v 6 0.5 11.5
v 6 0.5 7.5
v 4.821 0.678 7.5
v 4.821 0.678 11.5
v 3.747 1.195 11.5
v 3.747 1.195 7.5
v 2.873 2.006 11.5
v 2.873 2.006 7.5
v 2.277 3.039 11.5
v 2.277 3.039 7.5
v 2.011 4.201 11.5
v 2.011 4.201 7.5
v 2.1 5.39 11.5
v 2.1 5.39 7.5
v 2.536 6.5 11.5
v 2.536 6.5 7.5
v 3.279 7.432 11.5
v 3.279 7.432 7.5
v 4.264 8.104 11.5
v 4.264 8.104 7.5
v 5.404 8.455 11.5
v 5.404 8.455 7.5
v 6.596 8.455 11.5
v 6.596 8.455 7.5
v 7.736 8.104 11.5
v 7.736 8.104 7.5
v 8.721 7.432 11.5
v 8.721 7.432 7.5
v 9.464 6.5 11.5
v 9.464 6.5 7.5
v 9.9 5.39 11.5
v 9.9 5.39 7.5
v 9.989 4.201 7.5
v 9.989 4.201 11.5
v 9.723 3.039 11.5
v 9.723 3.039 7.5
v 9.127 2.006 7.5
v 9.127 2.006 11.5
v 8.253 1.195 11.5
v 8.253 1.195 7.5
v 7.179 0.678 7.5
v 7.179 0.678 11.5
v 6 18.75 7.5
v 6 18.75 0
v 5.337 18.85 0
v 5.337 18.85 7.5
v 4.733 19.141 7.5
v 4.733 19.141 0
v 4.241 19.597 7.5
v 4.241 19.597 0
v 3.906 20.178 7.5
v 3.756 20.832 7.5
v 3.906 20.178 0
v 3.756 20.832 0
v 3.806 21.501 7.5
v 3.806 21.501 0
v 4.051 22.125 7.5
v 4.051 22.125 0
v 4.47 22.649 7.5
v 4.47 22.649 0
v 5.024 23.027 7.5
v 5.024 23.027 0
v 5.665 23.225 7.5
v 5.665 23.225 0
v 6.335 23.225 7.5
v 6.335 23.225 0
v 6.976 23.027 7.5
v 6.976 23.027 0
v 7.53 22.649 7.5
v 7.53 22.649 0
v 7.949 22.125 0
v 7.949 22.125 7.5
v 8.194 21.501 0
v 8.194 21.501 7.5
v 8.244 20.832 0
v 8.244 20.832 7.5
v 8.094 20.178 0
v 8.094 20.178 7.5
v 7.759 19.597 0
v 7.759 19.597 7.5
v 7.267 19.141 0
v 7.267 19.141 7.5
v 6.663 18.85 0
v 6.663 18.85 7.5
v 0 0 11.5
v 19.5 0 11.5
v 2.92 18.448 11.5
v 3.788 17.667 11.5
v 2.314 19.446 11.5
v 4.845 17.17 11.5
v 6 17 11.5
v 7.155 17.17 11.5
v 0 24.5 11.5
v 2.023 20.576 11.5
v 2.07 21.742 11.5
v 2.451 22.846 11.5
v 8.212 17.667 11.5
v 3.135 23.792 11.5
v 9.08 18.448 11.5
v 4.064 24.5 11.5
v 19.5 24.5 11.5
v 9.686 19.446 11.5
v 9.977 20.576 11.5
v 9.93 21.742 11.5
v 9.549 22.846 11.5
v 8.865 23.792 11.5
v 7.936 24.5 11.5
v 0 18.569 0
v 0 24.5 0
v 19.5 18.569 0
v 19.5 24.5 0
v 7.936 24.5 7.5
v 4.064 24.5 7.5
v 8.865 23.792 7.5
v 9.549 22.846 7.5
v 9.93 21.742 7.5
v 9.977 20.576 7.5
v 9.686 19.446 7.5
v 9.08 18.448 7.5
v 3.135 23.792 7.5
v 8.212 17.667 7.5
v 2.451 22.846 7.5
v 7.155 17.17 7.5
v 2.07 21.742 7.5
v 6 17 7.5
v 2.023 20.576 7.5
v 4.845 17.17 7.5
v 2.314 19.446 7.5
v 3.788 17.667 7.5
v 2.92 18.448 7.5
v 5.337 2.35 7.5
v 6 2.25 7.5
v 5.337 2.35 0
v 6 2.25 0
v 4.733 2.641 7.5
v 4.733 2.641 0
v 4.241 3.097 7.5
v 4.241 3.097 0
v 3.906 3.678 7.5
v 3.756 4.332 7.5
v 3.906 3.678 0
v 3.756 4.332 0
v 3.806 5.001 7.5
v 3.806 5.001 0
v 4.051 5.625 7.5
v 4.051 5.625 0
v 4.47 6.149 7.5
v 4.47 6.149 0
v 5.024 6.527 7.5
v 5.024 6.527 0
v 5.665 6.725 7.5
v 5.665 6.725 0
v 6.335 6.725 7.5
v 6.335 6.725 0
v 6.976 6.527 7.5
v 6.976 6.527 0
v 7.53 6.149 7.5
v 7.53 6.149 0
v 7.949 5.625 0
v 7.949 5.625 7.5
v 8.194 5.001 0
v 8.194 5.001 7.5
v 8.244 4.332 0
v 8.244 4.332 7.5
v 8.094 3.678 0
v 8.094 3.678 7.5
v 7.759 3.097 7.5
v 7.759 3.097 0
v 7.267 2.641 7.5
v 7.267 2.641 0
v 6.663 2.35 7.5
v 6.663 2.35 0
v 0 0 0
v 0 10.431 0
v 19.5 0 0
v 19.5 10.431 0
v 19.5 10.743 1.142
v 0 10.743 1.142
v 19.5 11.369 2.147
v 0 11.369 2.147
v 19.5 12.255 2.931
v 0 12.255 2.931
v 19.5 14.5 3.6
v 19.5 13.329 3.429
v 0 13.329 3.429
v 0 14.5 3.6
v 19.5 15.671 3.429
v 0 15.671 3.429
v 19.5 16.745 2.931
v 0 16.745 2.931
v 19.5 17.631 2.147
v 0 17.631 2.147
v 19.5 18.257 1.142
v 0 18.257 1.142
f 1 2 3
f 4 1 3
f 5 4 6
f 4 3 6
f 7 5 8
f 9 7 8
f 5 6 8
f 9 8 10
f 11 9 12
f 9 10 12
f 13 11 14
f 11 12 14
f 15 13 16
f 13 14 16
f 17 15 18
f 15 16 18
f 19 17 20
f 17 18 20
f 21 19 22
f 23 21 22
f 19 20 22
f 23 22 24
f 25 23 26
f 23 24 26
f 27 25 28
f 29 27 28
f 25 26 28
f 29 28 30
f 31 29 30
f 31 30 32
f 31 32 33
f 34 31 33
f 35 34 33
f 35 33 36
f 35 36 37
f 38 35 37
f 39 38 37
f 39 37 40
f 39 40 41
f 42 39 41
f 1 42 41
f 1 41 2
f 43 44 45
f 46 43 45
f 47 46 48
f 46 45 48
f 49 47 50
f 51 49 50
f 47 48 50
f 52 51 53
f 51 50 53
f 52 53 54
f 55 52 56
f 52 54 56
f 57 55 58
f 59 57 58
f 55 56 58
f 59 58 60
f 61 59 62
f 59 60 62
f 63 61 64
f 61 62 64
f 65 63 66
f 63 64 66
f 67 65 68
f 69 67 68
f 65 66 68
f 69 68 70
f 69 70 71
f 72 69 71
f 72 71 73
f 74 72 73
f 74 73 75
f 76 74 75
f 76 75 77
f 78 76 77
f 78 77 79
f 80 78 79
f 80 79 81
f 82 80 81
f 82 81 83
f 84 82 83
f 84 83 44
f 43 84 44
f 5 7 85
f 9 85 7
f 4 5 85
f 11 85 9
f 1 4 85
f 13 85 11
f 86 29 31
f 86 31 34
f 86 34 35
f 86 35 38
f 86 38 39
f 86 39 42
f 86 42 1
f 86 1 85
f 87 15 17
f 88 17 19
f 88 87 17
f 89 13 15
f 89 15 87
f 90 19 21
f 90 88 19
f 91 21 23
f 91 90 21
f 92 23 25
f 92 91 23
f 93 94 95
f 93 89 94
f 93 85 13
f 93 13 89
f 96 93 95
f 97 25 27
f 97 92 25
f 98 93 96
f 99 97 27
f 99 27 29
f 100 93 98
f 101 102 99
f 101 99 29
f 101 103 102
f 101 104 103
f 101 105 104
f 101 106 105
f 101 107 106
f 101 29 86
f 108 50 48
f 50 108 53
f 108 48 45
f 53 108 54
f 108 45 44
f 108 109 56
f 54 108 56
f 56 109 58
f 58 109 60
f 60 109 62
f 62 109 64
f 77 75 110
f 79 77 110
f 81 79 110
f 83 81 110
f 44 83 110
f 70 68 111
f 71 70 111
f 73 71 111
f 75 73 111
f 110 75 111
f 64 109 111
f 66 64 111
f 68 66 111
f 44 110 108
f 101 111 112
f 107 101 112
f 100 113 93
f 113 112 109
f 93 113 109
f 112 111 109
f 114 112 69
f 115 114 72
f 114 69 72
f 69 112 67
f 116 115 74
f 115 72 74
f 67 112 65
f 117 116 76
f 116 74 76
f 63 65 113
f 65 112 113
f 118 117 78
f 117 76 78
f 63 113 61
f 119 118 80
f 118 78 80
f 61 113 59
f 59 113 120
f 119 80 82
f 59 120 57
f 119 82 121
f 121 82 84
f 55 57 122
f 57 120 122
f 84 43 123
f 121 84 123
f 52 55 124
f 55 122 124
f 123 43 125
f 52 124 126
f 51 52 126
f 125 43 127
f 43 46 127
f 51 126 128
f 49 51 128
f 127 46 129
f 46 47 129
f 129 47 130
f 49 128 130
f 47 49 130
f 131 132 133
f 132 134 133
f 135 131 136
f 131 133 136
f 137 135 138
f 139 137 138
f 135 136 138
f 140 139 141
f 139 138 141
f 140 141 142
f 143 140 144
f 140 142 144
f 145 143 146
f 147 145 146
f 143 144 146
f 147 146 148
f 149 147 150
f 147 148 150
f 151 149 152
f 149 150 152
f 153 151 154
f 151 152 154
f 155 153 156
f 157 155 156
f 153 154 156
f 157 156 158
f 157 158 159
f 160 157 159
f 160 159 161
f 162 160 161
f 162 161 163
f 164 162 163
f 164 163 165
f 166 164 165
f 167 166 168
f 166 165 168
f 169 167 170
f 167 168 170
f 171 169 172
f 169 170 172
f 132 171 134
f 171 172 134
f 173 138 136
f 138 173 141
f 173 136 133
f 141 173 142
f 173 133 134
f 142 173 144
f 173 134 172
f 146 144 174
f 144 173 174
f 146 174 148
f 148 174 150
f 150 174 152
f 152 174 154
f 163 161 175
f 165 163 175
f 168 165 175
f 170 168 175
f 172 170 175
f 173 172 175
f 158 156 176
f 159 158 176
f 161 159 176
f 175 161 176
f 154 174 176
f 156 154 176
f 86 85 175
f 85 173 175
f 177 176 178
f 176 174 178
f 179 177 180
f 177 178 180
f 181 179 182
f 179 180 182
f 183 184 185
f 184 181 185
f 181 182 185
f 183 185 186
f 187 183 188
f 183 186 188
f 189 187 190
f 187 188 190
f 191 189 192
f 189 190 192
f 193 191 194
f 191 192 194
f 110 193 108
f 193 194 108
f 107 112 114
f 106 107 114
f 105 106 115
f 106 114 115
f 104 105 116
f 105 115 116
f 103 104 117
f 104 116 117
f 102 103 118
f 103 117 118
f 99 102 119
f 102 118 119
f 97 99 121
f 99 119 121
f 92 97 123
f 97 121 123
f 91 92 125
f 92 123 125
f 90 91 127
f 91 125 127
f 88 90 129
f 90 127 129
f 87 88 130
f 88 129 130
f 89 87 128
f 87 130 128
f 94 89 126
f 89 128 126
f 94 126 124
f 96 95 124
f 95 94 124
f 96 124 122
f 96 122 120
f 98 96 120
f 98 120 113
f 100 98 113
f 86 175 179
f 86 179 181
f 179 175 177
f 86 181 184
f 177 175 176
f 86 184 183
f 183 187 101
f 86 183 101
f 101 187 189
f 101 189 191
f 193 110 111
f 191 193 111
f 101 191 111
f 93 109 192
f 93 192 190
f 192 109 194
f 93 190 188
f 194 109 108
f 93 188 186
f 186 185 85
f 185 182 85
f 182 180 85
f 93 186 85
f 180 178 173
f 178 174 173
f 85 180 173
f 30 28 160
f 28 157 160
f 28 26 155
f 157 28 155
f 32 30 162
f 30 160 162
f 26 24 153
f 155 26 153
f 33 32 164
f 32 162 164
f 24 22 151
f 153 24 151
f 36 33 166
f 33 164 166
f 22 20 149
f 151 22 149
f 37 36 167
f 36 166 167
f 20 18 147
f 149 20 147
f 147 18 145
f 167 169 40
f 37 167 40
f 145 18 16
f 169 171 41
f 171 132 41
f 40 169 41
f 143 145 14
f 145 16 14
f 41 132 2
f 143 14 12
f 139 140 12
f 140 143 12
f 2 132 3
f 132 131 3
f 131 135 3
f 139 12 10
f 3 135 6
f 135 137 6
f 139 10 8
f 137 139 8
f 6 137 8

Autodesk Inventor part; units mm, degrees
ref_plane "YZ Plane" through (0, 0, 0) normal (1, 0, 0) x (0, 1, 0)
ref_plane "XZ Plane" through (0, 0, 0) normal (0, 1, 0) x (-1, 0, 0)
ref_plane "XY Plane" through (0, 0, 0) normal (0, 0, 1) x (1, 0, 0)
sketch "Sketch1" plane through (0, 0, 0) normal (0, 0, 1) x (1, 0, 0)
  line L0 (0, 0) -> (19.5, 0)
  line L1 (19.5, 0) -> (19.5, 24.5)
  line L2 (19.5, 24.5) -> (0, 24.5)
  line L3 (0, 24.5) -> (0, 0)
  dimension "d0" = 24.5
  dimension "d1" = 19.5
extrude "Extrusion1" add sketch "Sketch1" along normal blind 11.5
sketch "Sketch2" plane through (0, 0, 11.5) normal (0, 0, 1) x (1, 0, 0)
  line L0 (0, 0) -> (19.5, 0) projected
  line L1 (0, 24.5) -> (0, 0) projected
  point P0 (6, 21)
  point P1 (6, 4.5)
  dimension "d4" = 4.5
  dimension "d5" = 6
  dimension "d27" = 16.5
hole "Hole1" at (6, 21, 11.5) at (6, 4.5, 11.5) direction (0, 0, -1) diameter 4.5 end up to surface counterbore diameter 8 counterbore depth 4
sketch "Sketch4" plane through (0, 0, 0) normal (-1, 0, 0) x (0, 0, 1)
  line L0 (0, 24.5) -> (0, 0) projected
  line L1 (0, 24.5) -> (11.5, 24.5) projected
  circle A0 centre (-0.5, 14.5) radius 4.1
  dimension "d19" = 8.2
  dimension "d20" = 0.5
  dimension "d21" = 10
extrude "Extrusion3" cut sketch "Sketch4" against normal up to surface (19.5 mm away)
sketch "Sketch5" plane through (6, 21, 7.5) normal (0, 0, 1) x (1, 0, 0)
  circle A0 centre (0, 0) radius 4 projected
  circle A1 centre (0, -16.5) radius 3.5 projected
  circle A2 centre (0, -16.5) radius 2 projected
  point P0 (-6, -21)
properties part number "YIdlerCapLeft" material "ABS Plastic"
